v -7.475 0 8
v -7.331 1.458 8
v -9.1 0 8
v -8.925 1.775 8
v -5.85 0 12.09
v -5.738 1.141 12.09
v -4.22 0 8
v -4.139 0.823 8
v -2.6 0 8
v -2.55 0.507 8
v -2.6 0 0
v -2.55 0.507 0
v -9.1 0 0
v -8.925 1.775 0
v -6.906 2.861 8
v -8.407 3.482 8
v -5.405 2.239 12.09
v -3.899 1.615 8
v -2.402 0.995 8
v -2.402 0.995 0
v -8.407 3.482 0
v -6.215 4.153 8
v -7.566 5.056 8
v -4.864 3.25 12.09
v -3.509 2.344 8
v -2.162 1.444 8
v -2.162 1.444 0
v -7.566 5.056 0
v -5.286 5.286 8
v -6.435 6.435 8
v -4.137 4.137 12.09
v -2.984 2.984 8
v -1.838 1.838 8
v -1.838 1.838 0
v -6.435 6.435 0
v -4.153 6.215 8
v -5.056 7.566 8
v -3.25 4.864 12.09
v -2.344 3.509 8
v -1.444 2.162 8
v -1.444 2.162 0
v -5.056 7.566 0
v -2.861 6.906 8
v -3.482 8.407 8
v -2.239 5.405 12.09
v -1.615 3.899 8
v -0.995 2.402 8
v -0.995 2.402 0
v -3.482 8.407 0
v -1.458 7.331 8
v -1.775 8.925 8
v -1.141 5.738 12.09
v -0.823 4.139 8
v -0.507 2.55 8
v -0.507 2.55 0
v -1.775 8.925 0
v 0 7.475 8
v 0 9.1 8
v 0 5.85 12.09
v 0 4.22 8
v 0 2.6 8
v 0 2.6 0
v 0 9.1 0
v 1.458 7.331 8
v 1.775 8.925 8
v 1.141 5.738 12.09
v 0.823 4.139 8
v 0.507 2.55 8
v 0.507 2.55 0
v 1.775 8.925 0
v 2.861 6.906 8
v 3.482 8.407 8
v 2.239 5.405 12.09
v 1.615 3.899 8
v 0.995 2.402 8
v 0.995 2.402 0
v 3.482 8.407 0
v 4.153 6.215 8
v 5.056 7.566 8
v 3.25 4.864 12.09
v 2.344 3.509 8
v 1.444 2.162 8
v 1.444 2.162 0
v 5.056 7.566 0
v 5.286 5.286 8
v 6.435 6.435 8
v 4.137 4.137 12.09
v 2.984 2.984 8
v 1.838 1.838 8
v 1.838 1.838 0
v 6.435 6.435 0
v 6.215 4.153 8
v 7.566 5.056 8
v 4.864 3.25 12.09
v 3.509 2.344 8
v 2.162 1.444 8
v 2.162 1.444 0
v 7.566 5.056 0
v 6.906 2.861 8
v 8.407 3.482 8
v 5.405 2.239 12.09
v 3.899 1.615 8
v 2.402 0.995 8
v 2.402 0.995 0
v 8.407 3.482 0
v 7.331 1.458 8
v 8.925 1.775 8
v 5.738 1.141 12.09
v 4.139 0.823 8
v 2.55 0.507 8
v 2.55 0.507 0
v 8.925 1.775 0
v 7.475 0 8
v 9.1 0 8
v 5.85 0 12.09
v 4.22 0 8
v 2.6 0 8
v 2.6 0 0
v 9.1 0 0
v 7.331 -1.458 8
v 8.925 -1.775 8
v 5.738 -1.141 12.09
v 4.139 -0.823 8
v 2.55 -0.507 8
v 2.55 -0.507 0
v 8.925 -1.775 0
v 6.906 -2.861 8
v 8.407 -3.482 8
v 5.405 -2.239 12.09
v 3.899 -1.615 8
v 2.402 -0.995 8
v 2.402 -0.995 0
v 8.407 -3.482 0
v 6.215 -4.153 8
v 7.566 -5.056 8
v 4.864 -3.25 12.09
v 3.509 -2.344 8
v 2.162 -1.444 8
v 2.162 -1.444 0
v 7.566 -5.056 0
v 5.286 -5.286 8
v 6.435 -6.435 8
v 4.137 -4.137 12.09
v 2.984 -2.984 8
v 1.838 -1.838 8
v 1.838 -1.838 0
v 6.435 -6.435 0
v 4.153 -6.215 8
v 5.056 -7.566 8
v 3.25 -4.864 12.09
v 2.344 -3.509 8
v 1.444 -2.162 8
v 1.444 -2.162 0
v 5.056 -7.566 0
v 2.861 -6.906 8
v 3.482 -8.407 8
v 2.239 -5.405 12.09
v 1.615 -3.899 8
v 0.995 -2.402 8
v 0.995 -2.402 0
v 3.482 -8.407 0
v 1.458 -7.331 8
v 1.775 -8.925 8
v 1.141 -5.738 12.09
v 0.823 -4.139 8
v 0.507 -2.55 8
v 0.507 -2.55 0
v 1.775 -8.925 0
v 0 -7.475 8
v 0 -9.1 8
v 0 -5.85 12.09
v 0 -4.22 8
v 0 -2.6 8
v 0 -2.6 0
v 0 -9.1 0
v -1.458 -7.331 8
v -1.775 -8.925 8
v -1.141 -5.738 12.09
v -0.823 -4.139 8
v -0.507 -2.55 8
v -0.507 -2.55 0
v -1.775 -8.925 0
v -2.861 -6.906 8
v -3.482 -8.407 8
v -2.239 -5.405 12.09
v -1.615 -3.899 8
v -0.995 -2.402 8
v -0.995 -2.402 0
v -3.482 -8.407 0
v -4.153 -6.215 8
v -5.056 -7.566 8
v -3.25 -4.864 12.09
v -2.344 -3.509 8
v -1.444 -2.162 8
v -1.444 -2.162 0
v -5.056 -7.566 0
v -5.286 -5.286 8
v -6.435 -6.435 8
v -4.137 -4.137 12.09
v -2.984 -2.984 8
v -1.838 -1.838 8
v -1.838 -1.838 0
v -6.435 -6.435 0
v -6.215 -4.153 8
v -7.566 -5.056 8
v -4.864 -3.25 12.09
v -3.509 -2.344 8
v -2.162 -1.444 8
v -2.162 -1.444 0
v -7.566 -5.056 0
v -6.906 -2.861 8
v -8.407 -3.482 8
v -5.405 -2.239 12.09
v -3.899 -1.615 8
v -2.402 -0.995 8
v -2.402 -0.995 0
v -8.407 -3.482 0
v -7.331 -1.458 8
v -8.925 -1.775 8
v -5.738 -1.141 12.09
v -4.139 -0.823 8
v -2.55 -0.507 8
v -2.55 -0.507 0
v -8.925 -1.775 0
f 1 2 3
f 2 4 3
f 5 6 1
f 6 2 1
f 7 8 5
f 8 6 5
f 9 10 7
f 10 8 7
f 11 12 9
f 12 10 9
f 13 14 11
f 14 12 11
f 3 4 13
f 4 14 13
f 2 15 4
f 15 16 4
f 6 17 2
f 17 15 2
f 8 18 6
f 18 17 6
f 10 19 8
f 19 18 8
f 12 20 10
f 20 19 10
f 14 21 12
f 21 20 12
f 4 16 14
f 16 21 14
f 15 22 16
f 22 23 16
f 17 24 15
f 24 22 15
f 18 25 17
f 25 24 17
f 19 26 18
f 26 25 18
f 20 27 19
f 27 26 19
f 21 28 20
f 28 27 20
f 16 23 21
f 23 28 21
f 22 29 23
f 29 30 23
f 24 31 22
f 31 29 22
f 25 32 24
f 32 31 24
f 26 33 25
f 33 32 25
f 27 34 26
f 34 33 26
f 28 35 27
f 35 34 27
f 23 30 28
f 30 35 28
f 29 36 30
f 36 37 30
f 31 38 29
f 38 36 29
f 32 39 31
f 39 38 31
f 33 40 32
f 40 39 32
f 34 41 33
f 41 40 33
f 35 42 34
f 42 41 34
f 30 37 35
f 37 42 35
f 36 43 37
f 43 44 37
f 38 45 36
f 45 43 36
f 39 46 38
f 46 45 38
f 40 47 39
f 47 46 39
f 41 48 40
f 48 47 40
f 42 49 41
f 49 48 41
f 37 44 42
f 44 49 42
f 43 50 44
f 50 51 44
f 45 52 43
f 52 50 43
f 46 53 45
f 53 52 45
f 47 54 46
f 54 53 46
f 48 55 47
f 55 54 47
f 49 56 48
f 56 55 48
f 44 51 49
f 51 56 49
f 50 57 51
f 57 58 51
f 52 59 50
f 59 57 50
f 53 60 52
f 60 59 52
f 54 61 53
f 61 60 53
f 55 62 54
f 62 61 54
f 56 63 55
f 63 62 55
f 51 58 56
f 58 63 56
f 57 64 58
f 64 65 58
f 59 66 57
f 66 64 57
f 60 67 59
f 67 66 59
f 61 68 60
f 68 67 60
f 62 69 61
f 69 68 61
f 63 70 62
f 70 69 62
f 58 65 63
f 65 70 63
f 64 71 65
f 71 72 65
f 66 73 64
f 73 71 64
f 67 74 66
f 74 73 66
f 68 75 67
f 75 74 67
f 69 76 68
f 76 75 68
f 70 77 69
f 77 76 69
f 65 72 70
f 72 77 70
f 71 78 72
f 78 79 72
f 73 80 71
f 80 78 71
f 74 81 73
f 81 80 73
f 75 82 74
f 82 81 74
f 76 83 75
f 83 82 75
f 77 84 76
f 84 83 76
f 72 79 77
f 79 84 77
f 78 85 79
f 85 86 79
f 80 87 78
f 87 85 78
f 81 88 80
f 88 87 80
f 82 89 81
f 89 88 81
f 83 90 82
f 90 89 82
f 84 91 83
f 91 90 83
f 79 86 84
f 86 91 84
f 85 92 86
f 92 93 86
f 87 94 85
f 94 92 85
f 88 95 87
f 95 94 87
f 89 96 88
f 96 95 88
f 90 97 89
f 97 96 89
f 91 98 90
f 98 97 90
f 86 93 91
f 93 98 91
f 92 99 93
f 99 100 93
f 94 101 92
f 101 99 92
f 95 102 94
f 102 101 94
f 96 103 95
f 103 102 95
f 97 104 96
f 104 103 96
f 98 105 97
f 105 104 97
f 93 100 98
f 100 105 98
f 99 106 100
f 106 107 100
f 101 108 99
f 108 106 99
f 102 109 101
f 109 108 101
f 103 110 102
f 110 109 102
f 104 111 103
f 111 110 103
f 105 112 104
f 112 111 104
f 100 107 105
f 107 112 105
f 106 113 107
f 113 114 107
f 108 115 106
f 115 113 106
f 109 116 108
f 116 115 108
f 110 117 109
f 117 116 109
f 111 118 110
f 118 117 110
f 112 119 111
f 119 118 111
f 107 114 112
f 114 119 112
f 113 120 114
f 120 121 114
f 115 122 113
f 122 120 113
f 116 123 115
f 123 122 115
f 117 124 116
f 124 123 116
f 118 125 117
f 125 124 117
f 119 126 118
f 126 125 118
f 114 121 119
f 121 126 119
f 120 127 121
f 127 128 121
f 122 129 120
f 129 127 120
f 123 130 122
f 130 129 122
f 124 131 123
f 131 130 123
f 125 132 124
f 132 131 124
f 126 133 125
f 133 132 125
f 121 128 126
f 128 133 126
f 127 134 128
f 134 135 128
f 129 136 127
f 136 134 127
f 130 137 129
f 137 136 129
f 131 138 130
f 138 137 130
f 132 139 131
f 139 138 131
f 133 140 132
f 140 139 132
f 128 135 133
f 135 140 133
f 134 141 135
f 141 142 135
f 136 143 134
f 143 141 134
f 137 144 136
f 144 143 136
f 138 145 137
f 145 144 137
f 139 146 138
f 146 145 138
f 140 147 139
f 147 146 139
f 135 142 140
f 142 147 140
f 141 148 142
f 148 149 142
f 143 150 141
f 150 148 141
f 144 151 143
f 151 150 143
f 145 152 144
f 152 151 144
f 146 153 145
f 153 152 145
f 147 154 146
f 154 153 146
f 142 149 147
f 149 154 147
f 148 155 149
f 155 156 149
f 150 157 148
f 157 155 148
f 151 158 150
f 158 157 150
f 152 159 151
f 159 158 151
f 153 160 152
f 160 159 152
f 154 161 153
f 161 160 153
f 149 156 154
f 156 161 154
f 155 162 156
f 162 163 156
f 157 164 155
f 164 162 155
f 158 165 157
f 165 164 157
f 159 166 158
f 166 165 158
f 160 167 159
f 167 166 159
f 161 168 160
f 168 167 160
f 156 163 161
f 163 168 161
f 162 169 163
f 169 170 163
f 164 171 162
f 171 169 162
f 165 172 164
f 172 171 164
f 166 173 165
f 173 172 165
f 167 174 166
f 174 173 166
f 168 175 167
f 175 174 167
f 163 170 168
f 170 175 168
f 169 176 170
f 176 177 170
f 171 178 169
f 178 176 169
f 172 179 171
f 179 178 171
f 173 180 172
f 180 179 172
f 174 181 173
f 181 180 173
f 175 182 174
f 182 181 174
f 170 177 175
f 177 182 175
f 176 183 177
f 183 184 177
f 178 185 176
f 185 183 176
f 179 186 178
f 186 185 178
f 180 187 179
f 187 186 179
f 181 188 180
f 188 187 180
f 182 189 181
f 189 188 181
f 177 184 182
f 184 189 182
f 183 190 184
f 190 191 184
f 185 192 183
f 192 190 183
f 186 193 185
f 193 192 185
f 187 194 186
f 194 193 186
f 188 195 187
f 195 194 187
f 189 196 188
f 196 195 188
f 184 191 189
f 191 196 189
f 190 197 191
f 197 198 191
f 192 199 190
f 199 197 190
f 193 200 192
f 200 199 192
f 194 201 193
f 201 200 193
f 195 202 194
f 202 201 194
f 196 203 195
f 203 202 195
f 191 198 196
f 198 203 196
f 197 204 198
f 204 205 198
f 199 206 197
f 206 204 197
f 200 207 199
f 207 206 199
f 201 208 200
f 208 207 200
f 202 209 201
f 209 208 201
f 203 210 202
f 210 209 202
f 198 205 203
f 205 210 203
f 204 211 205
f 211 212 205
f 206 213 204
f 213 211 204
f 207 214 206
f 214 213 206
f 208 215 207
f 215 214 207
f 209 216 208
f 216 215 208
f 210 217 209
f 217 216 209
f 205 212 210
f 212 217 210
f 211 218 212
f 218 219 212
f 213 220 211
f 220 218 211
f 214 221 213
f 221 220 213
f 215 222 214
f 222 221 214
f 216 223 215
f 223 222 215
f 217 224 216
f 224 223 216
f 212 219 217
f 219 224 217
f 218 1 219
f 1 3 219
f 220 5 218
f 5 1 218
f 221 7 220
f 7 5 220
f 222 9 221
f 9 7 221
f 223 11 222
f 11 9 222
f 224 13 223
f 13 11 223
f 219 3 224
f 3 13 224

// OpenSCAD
$fn = 32;

// ----------------------------------------------------------------------
// Form washer: domed washer, 18.2 mm outside, 5.2 mm bore
// ----------------------------------------------------------------------

// --- parameters (mm) ---
revolve_angle = 360;      // full turn around the Z axis
profile_points = 7;       // points of the closed outline

profile = [[2.6, 0], [9.1, 0], [9.1, 8], [7.475, 8], [5.85, 12.09], [4.22, 8], [2.6, 8]];  // single closed polygon, 7 points, counter clockwise

// --- the one profile operation ---
rotate_extrude(angle = revolve_angle) polygon(points = profile);
